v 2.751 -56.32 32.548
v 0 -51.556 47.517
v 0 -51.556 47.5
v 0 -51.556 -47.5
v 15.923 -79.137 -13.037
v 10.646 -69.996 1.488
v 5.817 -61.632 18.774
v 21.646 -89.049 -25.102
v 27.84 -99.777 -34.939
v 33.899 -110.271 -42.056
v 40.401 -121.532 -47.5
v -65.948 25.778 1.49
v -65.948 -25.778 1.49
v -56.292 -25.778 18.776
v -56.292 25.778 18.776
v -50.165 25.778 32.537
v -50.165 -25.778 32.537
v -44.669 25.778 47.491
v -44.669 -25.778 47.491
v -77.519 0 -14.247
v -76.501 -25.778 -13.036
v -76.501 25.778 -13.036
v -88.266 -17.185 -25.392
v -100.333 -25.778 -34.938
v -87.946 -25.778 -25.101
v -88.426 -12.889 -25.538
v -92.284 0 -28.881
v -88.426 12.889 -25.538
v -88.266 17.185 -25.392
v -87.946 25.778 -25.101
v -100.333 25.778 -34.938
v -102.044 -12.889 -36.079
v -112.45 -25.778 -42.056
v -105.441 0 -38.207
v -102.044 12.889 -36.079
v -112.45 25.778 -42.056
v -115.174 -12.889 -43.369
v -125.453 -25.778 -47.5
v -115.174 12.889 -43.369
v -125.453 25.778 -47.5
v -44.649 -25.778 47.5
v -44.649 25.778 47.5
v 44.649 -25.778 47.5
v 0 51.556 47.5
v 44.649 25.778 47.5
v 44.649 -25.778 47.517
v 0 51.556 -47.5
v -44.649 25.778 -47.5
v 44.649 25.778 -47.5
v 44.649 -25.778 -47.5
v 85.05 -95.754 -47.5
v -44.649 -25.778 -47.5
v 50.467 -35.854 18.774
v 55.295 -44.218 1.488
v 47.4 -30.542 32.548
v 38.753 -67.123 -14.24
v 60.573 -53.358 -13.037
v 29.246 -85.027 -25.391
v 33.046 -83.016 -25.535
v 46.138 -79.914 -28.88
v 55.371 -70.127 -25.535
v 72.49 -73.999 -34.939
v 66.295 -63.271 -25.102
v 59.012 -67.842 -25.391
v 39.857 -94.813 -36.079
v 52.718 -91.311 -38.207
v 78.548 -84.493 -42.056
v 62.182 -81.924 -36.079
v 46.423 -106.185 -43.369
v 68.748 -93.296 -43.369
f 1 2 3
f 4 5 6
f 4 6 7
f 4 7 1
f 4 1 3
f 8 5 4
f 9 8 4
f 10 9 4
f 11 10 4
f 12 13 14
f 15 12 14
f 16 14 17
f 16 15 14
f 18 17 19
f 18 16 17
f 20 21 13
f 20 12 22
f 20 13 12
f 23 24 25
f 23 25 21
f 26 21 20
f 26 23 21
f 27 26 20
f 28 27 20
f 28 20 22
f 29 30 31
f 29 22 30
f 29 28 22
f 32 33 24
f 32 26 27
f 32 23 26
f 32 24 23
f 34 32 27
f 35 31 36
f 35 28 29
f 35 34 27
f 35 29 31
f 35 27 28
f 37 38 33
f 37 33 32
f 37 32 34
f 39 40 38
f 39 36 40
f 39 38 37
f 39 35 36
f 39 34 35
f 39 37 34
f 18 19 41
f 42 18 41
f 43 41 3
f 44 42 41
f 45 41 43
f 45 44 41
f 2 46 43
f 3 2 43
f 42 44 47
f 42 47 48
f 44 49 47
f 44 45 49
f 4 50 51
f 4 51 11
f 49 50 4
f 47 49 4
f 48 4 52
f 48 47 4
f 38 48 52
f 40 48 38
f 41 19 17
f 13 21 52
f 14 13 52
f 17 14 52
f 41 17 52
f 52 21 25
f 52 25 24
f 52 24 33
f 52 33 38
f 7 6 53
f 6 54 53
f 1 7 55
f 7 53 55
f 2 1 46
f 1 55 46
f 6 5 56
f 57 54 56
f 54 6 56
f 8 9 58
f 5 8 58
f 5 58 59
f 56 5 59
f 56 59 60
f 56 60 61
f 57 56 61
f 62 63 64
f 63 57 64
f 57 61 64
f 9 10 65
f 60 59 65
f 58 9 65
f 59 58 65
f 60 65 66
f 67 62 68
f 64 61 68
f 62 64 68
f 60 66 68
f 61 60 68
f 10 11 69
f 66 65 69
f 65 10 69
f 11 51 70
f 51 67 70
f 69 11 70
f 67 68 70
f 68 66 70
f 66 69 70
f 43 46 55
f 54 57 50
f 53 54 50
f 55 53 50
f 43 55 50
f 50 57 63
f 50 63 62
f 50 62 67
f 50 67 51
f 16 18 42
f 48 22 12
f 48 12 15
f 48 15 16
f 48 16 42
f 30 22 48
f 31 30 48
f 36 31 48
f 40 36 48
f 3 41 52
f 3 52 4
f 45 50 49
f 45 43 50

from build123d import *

# Parameters (mm, degrees)
SALIENTE_EXTRUIR1_DEPTH = 47.5
SALIENTE_EXTRUIR2_DEPTH = 51.556282
SALIENTE_EXTRUIR3_DEPTH = 51.556282


with BuildPart() as part:
    # Croquis1 → Saliente-Extruir1 (new, symmetric)
    with BuildSketch(Plane.XY):
        Polygon((44.649051179, 25.778141718), (0, 51.556283435), (-44.649051179, 25.778141718), (-44.649051179, -25.778141718), (0, -51.556283435), (44.649051179, -25.778141718), align=None)
    extrude(amount=SALIENTE_EXTRUIR1_DEPTH, both=True)

    # Croquis6 → Saliente-Extruir2 (add)
    with BuildSketch(Plane(origin=(22.32452559, 12.889070859, 0), x_dir=(0, 0, -1), z_dir=(-0.8660254037844388, -0.49999999999999983, 0))):
        with BuildLine():
            Line((-47.516964524, 44.649051179), (47.5, 44.649051179))
            Line((47.5, 44.649051179), (47.5, 125.450551246))
            add(Edge.make_bspline(
                [(47.5, 125.450551246), (28.48813233, 69.96313115), (-47.516964524, 44.649051179)],
                knots=[0, 0, 0, 1, 1, 1], degree=2))
        make_face()
    extrude(amount=SALIENTE_EXTRUIR2_DEPTH)

    # Croquis8 → Saliente-Extruir3 (add)
    with BuildSketch(Plane(origin=(0, 25.778141718, 0), x_dir=(0, 0, -1), z_dir=(0, 1, 0))):
        with BuildLine():
            Line((47.5, 44.649051179), (47.5, 125.452857029))
            add(Edge.make_bspline(
                [(47.5, 125.452857029), (28.489618358, 69.977349558), (-47.490800068, 44.66905118)],
                knots=[0, 0, 0, 1, 1, 1], degree=2))
            Line((-47.490800068, 44.66905118), (-47.5, 44.649051179))
            Line((-47.5, 44.649051179), (47.5, 44.649051179))
        make_face()
    extrude(amount=-SALIENTE_EXTRUIR3_DEPTH)


solid = part.part
